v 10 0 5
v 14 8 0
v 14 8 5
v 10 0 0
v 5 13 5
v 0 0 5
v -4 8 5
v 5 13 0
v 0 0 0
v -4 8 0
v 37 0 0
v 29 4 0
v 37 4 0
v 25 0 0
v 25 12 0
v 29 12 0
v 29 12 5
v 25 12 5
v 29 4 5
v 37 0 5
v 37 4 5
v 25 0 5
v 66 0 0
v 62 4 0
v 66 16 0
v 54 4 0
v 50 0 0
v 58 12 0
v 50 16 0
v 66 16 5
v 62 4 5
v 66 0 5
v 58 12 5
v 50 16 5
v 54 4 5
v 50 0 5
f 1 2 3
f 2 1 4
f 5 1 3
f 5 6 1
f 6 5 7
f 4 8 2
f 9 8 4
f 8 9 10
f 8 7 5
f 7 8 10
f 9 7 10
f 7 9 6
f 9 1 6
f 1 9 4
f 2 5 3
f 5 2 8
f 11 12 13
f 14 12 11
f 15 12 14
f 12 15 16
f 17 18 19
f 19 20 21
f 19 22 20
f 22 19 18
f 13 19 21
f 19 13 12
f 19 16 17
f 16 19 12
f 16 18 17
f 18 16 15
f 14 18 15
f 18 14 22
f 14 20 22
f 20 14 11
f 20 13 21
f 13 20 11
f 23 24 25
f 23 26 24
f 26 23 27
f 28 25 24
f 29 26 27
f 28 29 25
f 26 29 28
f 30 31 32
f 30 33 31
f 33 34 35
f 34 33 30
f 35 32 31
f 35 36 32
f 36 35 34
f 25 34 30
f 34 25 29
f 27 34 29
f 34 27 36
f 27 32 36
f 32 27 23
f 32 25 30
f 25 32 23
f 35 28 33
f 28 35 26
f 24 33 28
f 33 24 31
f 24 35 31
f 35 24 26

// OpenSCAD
// TEST 08: polygon() — flat and extruded, with paths=
// Expected: pentagon shape, L-shape via points+paths.
// Check: polygon points render as flat filled mesh.
// Check: extruded polygon is a 3D solid.

// simple pentagon (no paths)
translate([0, 0, 0]) {
    linear_extrude(height=5) {
        polygon(points=[
            [0,   0  ],
            [10,  0  ],
            [14,  8  ],
            [5,   13 ],
            [-4,  8  ]
        ]);
    }
}

// polygon with explicit outer path (same points, explicit paths[0])
translate([25, 0, 0]) {
    linear_extrude(height=5) {
        polygon(
            points=[[0,0],[12,0],[12,4],[4,4],[4,12],[0,12]],
            paths=[[0,1,2,3,4,5]]
        );
    }
}

// polygon with hole: outer square minus inner triangle
translate([50, 0, 0]) {
    linear_extrude(height=5) {
        polygon(
            points=[[0,0],[16,0],[16,16],[0,16],  [4,4],[12,4],[8,12]],
            paths=[[0,1,2,3],[4,5,6]]
        );
    }
}
